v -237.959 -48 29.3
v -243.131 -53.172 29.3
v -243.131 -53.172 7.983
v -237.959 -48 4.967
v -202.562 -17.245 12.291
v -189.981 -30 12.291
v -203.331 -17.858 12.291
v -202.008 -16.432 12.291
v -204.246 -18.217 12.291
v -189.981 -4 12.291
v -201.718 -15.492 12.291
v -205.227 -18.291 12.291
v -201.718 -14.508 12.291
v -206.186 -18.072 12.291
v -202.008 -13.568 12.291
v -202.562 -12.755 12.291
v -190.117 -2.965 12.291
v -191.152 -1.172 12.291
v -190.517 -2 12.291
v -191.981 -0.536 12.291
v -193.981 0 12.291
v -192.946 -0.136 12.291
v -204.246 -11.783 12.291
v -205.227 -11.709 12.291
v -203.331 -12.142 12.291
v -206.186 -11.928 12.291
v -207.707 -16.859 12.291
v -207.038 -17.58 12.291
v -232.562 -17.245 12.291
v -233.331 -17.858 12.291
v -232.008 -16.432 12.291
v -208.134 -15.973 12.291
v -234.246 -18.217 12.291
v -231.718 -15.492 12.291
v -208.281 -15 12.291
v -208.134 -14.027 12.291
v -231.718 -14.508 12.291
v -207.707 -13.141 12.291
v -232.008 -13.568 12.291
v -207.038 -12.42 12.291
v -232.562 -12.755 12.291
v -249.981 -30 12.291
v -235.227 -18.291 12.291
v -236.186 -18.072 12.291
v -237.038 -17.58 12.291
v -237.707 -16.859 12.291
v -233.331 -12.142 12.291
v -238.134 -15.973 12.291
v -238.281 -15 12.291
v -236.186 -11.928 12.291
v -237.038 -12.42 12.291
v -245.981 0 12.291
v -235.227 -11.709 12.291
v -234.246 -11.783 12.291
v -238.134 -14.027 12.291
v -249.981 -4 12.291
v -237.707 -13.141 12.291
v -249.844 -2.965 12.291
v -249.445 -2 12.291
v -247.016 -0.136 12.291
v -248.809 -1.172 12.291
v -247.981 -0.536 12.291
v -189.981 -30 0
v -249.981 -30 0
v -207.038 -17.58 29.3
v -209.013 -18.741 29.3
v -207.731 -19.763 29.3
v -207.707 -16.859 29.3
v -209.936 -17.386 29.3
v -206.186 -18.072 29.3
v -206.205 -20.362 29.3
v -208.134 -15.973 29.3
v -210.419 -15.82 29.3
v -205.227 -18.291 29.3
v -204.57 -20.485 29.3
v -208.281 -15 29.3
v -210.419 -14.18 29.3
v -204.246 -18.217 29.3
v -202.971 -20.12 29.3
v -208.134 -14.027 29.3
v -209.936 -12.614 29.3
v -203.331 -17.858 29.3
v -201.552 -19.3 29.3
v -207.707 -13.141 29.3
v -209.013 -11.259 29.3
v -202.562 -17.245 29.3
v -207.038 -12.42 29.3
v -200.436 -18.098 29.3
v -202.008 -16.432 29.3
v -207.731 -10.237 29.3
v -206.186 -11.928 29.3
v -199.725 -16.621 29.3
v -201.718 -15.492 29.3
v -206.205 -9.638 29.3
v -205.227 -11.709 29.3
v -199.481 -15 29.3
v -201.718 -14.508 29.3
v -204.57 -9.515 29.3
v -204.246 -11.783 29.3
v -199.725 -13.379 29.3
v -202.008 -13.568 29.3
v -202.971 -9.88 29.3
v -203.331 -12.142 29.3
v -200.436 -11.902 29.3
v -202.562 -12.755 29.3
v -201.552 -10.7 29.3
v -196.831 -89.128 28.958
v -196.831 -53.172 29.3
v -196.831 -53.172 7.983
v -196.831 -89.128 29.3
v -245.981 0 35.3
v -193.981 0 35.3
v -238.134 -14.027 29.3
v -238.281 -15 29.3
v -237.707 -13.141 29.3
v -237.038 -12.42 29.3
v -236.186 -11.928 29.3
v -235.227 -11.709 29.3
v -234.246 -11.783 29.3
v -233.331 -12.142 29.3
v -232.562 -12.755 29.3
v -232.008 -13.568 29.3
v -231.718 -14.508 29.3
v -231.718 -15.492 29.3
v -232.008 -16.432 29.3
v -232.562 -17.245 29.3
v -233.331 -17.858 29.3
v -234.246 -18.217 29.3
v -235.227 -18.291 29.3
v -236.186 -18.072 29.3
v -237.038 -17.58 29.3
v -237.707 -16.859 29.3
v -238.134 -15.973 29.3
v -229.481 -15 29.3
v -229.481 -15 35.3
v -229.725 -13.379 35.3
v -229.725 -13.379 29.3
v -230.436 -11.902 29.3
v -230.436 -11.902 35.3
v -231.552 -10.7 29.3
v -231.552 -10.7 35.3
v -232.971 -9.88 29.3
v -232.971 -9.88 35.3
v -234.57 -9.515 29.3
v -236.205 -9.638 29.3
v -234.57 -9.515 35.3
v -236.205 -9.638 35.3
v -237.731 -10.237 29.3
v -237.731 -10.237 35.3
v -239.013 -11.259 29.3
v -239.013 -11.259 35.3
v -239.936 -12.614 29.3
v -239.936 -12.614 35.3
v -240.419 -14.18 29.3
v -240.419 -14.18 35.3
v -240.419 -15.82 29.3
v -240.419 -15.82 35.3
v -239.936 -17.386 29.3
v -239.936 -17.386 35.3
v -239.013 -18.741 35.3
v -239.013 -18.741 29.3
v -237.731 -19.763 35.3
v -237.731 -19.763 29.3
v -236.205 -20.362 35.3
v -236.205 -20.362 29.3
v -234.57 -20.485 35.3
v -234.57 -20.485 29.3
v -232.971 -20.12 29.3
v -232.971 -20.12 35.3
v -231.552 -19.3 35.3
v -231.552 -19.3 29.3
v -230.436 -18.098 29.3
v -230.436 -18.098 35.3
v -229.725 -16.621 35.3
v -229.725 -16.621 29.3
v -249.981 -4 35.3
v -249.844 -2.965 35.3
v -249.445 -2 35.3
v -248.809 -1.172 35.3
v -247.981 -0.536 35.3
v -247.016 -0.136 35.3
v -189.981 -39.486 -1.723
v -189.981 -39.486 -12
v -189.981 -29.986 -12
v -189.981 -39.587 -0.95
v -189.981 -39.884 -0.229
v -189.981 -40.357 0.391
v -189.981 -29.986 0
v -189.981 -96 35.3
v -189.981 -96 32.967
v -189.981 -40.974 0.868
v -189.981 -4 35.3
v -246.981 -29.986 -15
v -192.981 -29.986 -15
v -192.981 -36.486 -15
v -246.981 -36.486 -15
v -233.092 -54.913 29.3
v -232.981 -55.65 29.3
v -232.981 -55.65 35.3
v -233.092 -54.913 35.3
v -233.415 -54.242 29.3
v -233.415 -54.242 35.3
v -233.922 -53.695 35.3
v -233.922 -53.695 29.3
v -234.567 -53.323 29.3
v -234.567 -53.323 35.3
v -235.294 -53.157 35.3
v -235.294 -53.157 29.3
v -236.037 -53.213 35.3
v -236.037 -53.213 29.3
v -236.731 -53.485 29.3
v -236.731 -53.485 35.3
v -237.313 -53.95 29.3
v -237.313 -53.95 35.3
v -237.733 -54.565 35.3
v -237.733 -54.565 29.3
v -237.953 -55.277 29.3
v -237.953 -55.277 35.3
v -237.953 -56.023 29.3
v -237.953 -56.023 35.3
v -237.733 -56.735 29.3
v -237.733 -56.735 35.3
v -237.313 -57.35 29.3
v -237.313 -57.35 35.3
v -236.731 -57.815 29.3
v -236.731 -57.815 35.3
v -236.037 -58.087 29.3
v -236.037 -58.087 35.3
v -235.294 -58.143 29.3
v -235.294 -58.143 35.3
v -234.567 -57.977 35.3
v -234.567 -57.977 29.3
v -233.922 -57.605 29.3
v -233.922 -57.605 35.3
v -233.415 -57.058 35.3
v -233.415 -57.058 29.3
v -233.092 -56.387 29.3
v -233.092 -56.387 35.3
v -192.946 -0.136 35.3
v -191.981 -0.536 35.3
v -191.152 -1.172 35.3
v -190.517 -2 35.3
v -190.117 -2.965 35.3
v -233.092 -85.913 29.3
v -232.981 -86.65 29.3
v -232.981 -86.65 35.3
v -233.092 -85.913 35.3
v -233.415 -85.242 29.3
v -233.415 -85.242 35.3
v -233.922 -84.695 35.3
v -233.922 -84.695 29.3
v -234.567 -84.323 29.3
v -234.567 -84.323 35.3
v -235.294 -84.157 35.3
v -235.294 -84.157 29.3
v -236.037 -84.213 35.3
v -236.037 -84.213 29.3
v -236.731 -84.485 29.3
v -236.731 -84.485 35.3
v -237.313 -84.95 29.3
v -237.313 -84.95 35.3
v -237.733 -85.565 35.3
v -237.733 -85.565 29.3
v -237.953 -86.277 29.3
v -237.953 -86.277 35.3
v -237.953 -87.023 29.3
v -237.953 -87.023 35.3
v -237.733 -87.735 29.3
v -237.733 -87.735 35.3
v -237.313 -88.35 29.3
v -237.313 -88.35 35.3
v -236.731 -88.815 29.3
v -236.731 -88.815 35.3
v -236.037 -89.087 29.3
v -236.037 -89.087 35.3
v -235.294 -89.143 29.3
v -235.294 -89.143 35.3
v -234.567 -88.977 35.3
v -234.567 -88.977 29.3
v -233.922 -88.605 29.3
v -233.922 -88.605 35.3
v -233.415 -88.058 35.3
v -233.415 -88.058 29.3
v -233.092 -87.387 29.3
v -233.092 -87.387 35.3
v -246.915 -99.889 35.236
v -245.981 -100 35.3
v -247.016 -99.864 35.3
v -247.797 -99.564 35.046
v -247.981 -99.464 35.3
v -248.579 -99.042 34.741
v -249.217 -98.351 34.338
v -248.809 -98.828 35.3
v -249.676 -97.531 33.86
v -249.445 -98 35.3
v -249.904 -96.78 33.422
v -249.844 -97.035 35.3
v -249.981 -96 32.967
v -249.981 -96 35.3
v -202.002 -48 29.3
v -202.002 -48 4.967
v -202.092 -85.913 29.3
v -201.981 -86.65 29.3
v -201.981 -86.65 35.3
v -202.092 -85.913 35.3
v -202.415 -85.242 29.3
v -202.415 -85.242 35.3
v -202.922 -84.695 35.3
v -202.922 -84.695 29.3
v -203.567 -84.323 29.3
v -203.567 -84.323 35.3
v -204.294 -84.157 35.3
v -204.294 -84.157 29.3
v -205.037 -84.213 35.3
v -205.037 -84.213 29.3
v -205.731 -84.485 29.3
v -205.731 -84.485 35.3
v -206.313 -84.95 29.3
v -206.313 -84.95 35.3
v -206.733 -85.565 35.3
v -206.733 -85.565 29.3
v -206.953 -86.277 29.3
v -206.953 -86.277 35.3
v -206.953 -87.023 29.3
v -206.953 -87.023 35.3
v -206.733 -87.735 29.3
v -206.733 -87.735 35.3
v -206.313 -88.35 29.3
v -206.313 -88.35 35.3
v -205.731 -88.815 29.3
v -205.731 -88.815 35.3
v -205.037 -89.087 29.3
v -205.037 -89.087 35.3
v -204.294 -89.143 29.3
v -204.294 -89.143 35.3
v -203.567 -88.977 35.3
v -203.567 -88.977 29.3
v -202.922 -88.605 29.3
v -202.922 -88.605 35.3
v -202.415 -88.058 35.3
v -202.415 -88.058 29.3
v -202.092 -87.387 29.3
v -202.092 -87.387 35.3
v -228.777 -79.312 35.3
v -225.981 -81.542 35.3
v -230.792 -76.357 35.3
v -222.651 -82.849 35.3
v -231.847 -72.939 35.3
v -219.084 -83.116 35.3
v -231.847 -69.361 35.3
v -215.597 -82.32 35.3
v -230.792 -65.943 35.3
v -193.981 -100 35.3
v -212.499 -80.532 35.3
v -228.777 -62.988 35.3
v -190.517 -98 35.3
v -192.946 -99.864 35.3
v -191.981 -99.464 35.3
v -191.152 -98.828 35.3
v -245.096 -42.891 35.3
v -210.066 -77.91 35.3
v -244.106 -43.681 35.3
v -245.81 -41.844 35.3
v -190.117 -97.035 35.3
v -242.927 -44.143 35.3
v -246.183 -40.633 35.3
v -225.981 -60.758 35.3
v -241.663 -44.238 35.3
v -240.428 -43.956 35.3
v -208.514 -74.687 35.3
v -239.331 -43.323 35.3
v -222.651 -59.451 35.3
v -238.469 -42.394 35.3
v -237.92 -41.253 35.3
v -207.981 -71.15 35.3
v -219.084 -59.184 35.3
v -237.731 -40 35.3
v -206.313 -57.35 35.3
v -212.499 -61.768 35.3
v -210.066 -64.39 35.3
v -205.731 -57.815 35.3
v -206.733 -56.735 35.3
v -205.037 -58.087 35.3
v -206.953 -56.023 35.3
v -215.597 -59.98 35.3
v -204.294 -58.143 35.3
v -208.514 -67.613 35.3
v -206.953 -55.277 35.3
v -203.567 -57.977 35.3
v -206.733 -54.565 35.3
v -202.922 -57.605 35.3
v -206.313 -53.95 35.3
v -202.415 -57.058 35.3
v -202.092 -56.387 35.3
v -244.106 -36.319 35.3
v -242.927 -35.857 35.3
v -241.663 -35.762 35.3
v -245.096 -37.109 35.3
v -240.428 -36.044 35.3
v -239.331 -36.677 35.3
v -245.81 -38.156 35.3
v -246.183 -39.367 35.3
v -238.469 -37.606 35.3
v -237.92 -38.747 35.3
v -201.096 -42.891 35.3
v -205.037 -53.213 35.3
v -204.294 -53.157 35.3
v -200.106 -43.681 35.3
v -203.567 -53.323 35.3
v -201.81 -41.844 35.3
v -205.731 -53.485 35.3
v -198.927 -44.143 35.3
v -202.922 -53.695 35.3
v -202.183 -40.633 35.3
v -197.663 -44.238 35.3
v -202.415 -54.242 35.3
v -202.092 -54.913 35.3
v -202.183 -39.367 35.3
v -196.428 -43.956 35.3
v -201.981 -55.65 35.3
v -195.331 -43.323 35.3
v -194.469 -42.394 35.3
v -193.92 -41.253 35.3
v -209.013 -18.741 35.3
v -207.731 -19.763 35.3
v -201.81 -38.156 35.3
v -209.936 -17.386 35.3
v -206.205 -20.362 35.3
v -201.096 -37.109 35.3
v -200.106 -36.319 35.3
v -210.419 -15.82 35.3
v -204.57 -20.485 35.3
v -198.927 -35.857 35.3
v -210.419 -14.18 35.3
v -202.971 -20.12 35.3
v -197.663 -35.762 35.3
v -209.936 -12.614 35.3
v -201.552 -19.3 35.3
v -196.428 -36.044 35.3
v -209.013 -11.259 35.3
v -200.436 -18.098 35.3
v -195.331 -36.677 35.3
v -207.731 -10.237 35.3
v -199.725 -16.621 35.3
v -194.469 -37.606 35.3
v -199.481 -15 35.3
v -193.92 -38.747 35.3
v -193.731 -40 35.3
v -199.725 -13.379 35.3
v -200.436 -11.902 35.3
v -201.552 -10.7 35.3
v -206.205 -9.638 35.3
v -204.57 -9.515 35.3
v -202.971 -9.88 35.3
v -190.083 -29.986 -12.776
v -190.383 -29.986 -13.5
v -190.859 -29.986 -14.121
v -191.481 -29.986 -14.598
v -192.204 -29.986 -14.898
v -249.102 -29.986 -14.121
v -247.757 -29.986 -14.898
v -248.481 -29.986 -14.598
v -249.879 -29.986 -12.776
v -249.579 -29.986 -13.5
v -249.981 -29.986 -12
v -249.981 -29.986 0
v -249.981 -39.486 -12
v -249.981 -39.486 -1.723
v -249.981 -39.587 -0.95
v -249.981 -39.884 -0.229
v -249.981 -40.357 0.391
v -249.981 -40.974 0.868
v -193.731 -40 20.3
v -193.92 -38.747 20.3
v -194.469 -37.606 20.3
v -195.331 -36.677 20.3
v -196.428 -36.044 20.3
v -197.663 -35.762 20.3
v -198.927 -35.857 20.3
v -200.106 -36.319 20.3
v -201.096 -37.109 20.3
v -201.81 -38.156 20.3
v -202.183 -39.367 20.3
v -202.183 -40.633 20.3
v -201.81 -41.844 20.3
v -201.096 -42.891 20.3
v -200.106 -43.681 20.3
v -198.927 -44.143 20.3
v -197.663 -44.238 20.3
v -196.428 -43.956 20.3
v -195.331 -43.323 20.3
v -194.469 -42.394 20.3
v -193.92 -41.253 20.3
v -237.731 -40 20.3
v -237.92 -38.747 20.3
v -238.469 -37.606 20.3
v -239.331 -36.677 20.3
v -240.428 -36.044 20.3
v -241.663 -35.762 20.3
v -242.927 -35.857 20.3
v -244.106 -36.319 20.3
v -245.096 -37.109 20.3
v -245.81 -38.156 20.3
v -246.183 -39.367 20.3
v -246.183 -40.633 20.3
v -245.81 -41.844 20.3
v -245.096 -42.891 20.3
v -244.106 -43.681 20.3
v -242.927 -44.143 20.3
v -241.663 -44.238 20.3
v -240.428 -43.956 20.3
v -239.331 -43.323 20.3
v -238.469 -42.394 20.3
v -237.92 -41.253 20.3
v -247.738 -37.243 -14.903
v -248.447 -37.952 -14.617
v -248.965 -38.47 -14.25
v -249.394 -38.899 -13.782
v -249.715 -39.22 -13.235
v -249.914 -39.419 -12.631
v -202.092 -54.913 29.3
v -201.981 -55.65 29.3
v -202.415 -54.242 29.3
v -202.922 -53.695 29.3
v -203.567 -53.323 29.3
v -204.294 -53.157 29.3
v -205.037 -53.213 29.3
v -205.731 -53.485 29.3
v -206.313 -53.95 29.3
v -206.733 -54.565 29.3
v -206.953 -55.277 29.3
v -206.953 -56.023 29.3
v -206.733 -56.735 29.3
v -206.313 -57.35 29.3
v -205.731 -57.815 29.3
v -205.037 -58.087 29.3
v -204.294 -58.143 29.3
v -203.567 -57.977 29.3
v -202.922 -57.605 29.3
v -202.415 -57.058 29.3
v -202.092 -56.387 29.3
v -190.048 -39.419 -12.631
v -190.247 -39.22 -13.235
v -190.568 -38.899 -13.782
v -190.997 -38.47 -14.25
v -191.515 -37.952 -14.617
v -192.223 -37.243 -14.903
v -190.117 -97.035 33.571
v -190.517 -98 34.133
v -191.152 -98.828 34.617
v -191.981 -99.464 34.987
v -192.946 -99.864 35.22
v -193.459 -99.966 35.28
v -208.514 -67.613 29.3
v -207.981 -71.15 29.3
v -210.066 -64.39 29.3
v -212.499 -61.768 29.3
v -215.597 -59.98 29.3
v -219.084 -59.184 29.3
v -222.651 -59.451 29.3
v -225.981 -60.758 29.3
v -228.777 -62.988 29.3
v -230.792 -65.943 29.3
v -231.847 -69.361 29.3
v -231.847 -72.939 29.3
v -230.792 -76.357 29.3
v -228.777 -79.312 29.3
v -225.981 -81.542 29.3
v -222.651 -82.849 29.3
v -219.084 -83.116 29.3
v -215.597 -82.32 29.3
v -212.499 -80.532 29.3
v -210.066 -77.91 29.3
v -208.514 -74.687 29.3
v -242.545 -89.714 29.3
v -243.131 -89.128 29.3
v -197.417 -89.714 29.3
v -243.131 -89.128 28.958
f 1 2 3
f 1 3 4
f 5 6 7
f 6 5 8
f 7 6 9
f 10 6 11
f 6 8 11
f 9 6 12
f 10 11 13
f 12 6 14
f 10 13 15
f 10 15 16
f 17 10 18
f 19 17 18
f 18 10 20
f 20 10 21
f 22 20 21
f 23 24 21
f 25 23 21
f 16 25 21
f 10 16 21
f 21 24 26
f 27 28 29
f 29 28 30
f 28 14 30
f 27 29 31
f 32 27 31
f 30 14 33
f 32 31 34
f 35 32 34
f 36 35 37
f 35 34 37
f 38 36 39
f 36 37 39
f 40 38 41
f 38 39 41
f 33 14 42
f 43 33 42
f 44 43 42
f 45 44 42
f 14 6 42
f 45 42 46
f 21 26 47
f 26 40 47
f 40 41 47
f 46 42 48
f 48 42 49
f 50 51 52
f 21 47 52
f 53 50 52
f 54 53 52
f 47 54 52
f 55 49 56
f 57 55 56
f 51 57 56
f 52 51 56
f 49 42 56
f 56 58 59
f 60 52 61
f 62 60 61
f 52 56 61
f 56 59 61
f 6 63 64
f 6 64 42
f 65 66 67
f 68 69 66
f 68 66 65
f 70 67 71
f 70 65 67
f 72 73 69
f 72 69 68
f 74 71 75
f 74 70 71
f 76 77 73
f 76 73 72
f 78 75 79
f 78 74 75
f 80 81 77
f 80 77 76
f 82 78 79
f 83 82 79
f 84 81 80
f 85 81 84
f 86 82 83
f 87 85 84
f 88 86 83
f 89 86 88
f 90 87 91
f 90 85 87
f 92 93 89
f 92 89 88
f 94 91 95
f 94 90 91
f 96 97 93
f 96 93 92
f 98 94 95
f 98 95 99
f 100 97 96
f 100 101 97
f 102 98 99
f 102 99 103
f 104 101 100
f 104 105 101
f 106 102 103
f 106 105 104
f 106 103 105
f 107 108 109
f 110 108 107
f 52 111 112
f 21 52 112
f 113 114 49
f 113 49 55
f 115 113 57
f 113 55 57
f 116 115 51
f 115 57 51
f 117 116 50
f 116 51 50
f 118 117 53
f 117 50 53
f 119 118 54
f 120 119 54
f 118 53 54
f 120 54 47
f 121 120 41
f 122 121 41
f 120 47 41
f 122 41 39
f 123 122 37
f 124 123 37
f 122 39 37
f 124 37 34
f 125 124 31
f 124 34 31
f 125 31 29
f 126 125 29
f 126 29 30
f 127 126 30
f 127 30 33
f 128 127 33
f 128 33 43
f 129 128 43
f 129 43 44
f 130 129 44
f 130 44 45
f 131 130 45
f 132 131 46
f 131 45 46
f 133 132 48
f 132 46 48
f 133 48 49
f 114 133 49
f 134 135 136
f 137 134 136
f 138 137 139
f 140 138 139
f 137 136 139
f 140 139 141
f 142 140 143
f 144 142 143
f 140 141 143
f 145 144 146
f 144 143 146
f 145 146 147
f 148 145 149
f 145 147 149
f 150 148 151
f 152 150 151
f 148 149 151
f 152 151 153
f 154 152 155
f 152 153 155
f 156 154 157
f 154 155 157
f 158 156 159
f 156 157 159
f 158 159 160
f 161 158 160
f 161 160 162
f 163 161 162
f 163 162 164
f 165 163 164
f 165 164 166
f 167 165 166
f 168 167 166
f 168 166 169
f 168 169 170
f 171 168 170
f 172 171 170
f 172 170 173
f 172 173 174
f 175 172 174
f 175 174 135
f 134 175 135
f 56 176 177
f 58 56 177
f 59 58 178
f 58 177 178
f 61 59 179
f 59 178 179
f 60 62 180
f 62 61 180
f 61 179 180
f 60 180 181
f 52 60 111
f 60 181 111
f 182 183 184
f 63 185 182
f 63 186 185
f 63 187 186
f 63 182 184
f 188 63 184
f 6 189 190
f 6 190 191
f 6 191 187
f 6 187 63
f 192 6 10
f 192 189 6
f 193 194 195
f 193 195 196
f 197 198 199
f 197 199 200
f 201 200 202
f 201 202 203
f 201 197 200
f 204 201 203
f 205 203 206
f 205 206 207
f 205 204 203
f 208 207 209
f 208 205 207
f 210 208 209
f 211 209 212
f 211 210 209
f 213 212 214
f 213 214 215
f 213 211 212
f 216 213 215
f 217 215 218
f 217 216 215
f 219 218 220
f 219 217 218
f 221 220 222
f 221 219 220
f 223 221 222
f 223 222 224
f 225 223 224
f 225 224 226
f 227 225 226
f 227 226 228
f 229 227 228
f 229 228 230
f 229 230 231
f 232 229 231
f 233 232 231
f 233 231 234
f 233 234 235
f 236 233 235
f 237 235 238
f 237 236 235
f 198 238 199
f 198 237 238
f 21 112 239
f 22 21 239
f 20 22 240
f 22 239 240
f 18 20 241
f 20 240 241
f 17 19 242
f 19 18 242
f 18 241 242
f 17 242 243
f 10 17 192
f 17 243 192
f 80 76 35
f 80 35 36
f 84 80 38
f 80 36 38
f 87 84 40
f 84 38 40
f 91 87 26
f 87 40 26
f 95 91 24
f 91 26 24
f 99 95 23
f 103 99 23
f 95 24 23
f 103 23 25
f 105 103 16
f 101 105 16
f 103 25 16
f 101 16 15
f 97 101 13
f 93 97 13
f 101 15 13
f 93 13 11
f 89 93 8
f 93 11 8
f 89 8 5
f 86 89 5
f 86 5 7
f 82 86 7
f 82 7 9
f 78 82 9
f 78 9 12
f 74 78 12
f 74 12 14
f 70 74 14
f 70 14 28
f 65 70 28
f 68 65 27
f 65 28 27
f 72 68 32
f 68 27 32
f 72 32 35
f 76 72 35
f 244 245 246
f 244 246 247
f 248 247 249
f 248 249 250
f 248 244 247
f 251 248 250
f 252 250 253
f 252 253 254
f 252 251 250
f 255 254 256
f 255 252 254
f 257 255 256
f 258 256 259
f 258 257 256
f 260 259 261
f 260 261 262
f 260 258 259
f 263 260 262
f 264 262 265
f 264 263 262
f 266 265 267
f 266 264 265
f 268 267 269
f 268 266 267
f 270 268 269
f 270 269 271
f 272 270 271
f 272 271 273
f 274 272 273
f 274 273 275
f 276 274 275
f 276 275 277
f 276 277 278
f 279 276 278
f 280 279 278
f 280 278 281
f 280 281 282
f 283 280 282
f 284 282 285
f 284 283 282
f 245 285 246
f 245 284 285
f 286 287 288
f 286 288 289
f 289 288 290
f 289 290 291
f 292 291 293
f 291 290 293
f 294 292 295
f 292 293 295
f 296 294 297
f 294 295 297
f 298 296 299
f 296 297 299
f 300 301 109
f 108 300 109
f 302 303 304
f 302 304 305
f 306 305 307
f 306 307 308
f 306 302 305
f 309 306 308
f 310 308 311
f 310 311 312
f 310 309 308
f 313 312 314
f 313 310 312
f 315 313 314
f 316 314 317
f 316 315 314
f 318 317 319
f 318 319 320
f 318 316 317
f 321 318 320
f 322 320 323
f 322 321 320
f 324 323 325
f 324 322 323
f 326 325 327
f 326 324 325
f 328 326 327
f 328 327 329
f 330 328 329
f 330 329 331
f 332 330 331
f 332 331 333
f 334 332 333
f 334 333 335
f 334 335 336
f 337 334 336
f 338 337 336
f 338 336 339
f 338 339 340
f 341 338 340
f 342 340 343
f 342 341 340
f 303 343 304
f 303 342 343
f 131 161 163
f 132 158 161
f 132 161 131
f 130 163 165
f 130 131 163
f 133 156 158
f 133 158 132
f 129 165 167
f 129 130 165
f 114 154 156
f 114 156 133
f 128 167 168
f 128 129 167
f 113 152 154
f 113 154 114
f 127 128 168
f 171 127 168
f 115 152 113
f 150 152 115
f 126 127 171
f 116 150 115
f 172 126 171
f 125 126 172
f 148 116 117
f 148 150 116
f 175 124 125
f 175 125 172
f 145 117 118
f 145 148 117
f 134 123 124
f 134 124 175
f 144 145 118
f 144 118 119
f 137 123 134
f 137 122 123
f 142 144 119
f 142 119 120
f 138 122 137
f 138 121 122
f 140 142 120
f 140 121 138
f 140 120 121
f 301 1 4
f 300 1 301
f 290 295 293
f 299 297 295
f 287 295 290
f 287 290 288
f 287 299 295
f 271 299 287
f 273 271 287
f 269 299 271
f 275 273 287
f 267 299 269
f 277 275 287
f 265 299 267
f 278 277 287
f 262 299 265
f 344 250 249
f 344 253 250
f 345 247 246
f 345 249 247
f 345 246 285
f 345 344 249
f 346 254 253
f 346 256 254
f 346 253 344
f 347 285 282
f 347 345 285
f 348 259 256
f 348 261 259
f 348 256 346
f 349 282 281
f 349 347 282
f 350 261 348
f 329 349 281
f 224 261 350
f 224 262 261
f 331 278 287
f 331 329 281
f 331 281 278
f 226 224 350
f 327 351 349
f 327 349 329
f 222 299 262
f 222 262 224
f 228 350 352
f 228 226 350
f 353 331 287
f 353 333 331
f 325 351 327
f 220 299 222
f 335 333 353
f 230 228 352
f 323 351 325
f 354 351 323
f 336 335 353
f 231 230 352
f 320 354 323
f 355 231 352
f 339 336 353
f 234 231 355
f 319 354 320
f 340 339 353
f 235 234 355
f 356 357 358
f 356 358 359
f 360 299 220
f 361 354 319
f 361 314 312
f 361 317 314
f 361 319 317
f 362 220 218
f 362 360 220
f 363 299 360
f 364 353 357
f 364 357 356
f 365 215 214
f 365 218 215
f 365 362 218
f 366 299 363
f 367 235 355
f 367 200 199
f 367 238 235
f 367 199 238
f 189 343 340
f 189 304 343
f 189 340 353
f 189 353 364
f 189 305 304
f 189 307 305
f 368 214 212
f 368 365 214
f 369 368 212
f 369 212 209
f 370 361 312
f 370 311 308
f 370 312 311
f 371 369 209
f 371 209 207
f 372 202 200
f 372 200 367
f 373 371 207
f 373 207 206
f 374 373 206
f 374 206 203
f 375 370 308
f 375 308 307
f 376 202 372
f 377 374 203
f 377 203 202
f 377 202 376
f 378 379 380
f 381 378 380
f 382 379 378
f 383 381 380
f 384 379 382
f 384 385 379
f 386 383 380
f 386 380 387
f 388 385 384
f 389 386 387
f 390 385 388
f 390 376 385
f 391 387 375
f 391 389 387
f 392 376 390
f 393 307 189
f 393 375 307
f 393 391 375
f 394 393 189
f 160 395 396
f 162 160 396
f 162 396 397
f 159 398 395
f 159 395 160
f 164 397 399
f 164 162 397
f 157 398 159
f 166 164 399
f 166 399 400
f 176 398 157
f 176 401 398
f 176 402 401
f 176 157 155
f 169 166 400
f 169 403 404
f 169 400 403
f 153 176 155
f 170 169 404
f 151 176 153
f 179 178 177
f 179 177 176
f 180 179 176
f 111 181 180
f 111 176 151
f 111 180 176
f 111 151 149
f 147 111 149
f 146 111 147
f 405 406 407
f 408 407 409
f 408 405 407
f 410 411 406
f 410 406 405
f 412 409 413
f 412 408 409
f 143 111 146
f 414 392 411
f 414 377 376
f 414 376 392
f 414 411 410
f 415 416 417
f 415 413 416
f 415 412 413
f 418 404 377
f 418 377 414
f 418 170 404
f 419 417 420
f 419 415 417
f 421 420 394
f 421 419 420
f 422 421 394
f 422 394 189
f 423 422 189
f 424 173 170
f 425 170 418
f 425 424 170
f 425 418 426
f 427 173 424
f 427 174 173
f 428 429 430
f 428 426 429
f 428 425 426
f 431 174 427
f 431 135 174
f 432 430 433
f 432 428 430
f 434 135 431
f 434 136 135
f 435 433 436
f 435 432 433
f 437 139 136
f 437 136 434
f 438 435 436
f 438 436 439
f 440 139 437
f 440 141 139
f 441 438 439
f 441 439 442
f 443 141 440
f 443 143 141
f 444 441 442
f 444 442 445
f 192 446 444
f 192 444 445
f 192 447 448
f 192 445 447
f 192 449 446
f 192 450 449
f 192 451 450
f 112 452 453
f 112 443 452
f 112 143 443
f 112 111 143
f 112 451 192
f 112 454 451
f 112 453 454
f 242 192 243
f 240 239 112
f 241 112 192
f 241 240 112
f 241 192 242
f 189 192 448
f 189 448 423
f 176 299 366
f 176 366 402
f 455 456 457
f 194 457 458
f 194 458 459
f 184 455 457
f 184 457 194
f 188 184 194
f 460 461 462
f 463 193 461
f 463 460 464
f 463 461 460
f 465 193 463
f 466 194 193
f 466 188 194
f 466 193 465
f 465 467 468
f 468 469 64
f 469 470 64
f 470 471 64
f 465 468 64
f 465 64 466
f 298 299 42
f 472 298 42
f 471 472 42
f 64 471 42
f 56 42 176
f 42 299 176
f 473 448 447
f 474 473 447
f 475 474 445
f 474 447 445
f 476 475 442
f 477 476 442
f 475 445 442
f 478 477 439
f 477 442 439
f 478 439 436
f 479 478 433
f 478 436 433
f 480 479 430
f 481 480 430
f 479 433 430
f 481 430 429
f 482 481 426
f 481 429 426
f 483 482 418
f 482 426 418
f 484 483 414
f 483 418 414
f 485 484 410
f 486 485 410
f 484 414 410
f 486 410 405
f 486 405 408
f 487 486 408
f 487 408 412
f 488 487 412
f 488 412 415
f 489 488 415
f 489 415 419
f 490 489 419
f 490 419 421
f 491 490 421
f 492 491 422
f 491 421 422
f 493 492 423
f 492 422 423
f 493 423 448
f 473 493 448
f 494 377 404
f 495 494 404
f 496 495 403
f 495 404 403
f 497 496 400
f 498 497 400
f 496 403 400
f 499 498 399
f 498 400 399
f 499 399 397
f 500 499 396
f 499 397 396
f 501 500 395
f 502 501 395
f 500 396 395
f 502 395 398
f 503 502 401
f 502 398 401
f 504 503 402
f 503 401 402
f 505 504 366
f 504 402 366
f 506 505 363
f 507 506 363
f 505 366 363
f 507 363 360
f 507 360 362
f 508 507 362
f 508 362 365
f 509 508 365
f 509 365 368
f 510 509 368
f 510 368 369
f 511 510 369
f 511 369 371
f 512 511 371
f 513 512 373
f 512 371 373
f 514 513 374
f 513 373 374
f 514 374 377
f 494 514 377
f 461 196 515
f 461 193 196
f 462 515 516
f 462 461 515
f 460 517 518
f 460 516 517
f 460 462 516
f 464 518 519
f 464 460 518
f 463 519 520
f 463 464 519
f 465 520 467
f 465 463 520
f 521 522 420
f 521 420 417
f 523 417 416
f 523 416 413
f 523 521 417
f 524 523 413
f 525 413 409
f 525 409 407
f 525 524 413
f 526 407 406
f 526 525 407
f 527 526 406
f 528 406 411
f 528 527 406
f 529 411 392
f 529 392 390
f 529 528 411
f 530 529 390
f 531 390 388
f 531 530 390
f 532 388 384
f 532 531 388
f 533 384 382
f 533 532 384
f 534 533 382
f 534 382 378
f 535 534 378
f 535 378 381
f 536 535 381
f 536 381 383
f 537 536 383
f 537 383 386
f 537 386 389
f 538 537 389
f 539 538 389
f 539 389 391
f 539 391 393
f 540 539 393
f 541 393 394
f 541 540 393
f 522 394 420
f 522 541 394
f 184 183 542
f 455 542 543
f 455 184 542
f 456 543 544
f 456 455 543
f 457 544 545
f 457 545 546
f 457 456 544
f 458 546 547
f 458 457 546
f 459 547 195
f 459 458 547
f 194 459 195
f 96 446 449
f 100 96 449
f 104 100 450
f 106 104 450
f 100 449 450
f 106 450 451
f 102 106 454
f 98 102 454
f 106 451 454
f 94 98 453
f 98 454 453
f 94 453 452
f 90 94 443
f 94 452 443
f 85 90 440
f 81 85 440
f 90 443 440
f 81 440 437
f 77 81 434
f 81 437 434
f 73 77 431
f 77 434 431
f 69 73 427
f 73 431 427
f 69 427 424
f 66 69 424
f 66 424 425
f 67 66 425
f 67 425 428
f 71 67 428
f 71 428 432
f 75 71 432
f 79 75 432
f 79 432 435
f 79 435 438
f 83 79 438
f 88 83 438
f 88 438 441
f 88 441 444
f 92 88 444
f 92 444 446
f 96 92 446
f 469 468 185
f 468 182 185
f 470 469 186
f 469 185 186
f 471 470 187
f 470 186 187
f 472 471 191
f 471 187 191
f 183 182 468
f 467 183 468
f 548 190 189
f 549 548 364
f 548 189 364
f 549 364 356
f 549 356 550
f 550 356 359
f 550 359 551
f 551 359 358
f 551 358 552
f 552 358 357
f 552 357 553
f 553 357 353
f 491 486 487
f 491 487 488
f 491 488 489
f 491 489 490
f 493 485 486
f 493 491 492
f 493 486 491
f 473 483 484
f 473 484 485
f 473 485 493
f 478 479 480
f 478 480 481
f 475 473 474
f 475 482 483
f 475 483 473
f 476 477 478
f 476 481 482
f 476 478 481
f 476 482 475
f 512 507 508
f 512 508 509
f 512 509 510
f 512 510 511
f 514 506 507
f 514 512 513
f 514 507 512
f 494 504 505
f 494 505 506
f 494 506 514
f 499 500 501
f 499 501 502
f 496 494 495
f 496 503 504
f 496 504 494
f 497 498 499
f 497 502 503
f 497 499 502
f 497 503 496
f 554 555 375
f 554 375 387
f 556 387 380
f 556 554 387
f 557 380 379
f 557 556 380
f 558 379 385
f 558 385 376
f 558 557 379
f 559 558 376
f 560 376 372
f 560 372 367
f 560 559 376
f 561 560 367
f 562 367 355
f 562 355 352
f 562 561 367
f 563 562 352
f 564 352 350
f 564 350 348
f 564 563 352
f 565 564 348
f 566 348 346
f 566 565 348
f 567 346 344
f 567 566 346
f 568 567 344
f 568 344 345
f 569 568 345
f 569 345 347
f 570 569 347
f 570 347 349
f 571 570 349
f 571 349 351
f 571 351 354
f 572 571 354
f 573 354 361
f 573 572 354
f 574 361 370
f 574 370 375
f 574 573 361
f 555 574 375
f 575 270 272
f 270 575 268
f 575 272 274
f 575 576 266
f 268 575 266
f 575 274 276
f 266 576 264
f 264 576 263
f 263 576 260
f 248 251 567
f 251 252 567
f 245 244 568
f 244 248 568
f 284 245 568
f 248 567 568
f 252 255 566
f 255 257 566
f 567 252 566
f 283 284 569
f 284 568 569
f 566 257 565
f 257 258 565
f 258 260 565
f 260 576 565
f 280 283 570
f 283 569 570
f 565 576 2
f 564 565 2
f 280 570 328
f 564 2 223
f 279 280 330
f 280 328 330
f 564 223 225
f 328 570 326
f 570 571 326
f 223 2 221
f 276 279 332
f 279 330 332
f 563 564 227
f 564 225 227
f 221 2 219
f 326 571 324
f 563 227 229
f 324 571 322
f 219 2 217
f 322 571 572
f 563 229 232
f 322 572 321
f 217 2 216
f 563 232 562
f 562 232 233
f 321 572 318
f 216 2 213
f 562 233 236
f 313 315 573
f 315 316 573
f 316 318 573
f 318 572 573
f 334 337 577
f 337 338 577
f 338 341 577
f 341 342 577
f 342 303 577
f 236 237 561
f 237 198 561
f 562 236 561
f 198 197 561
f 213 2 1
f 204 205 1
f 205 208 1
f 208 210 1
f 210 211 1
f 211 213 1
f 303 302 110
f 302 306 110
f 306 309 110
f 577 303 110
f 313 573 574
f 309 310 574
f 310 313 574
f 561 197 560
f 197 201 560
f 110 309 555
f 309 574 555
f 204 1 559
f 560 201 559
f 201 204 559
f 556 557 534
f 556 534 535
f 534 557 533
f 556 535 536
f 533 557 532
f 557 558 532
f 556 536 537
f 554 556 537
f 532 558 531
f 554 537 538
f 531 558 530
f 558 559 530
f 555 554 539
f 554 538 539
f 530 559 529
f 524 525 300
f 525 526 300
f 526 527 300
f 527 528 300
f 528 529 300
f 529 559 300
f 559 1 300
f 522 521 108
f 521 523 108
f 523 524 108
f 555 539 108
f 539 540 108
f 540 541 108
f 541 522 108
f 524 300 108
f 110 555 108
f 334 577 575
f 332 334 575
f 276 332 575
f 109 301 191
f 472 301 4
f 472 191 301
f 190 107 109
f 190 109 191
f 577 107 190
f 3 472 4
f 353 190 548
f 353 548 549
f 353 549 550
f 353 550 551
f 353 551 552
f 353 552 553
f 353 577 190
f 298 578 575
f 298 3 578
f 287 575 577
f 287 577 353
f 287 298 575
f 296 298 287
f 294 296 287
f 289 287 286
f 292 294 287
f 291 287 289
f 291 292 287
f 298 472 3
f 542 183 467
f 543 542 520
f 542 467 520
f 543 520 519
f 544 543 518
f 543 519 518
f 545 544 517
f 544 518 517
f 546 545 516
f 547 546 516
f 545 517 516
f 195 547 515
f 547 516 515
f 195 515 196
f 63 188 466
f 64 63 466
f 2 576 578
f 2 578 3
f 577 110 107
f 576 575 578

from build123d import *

# Parameters (mm, degrees)
ESBO_O1_R                         = 12
ESBO_O1_R_2                       = 2.5
RESSALTO_EXTRUS_O1_DEPTH          = 6
RESSALTO_EXTRUS_O2_DEPTH          = 50
CORTE_EXTRUS_O1_DEPTH             = 61
ESBO_O5_R                         = 4.25
CORTE_EXTRUS_O2_DEPTH             = 15
REBAIXO_PARA_SHCS_M61_D           = 6.6
REBAIXO_PARA_SHCS_M61_CBORE_D     = 11
REBAIXO_PARA_SHCS_M61_CBORE_DEPTH = 6
CORTE_EXTRUS_O3_DEPTH             = 61
ESBO_O4_W                         = 60
ESBO_O4_H                         = 9.5
RESSALTO_EXTRUS_O3_DEPTH          = 15
FILETE1_R                         = 3


with BuildPart() as part:
    # Esboço1 → Ressalto-extrusão1 (new body)
    with BuildSketch(Plane.XY.offset(29.3)):
        with BuildLine():
            Line((-245.980789633, -100), (-193.980789633, -100))
            ThreePointArc((-193.980789633, -100), (-191.152362508, -98.828427125), (-189.980789633, -96))
            Line((-189.980789633, -96), (-189.980789633, -4))
            ThreePointArc((-189.980789633, -4), (-191.152362508, -1.171572875), (-193.980789633, 0))
            Line((-193.980789633, 0), (-245.980789633, 0))
            ThreePointArc((-245.980789633, 0), (-248.809216758, -1.171572875), (-249.980789633, -4))
            Line((-249.980789633, -4), (-249.980789633, -96))
            ThreePointArc((-249.980789633, -96), (-248.809216758, -98.828427125), (-245.980789633, -100))
        make_face()
        with Locations((-219.980789633, -71.15)):
            Circle(ESBO_O1_R, mode=Mode.SUBTRACT)
        with Locations((-235.480789633, -86.65)):
            Circle(ESBO_O1_R_2, mode=Mode.SUBTRACT)
        with Locations((-235.480789633, -55.65)):
            Circle(ESBO_O1_R_2, mode=Mode.SUBTRACT)
        with Locations((-204.480789633, -86.65)):
            Circle(ESBO_O1_R_2, mode=Mode.SUBTRACT)
        with Locations((-204.480789633, -55.65)):
            Circle(ESBO_O1_R_2, mode=Mode.SUBTRACT)
    extrude(amount=RESSALTO_EXTRUS_O1_DEPTH)

    # Esboço2 → Ressalto-extrusão2 (add)
    with BuildSketch(Plane(origin=(0, 0, 29.3), x_dir=(-1, 0, 0), z_dir=(0, 0, -1))):
        with BuildLine():
            Line((189.980789633, -4), (189.980789633, -96))
            ThreePointArc((189.980789633, -96), (191.152362508, -98.828427125), (193.980789633, -100))
            Line((193.980789633, -100), (245.980789633, -100))
            ThreePointArc((245.980789633, -100), (248.809216758, -98.828427125), (249.980789633, -96))
            Line((249.980789633, -96), (249.980789633, -4))
            ThreePointArc((249.980789633, -4), (248.809216758, -1.171572875), (245.980789633, 0))
            Line((245.980789633, 0), (193.980789633, 0))
            ThreePointArc((193.980789633, 0), (191.152362508, -1.171572875), (189.980789633, -4))
        make_face()
        Polygon((237.959216758, -48), (202.002362508, -48), (196.830789633, -53.171572875), (196.830789633, -89.128427125), (202.002362508, -94.3), (237.959216758, -94.3), (243.130789633, -89.128427125), (243.130789633, -53.171572875), align=None, mode=Mode.SUBTRACT)
    extrude(amount=RESSALTO_EXTRUS_O2_DEPTH)

    # Esboço3 → Corte-extrusão1 (cut, through all)
    with BuildSketch(Plane.ZY.offset(249.980789633)):
        Polygon((35.3, -100), (-20.7, -100), (-20.7, -31.056412858), (0, -31.056412858), (0, -39.485714286), align=None)
    extrude(amount=-CORTE_EXTRUS_O1_DEPTH, mode=Mode.SUBTRACT)

    # Esboço5 → Corte-extrusão2 (cut)
    with BuildSketch(Plane.XY.offset(35.3)):
        with Locations((-241.980789633, -40)):
            Circle(ESBO_O5_R)
        with Locations((-197.980789633, -40)):
            Circle(ESBO_O5_R)
    extrude(amount=-CORTE_EXTRUS_O2_DEPTH, mode=Mode.SUBTRACT)

    # Rebaixo para SHCS M61 (through all)
    with Locations(Plane.XY.offset(35.3)):
        with Locations((-234.980789633, -15), (-204.980789633, -15)):
            CounterBoreHole(REBAIXO_PARA_SHCS_M61_D / 2, REBAIXO_PARA_SHCS_M61_CBORE_D / 2, REBAIXO_PARA_SHCS_M61_CBORE_DEPTH)

    # Esboço10 → Corte-extrusão3 (cut, through all)
    with BuildSketch(Plane.ZY.offset(249.980789633)):
        Polygon((12.291276716, 1.7848e-05), (-27.708723284, 1.7848e-05), (-27.708723284, -29.999982152), (-21.235336221, -29.999982152), (-21.235336221, -31.532793492), (0, -31.532793492), (0, -29.999982152), (12.291276716, -29.999982152), align=None)
    extrude(amount=-CORTE_EXTRUS_O3_DEPTH, mode=Mode.SUBTRACT)

    # Esboço4 → Ressalto-extrusão3 (add)
    with BuildSketch(Plane(origin=(0, 0, 0), x_dir=(-1, 0, 0), z_dir=(0, 0, -1))):
        with Locations((219.980789633, -34.735714286)):
            Rectangle(ESBO_O4_W, ESBO_O4_H)
    extrude(amount=RESSALTO_EXTRUS_O3_DEPTH)

    # Filete1
    filete1_edges = [part.edges().sort_by_distance(p)[0] for p in [
        (-219.980789633, -39.485714286, 0),
        (-189.980789633, -34.735714286, -15),
        (-219.980789633, -39.485714286, -15),
        (-249.980789633, -34.735714286, -15),
    ]]
    fillet(filete1_edges, radius=FILETE1_R)


solid = part.part
